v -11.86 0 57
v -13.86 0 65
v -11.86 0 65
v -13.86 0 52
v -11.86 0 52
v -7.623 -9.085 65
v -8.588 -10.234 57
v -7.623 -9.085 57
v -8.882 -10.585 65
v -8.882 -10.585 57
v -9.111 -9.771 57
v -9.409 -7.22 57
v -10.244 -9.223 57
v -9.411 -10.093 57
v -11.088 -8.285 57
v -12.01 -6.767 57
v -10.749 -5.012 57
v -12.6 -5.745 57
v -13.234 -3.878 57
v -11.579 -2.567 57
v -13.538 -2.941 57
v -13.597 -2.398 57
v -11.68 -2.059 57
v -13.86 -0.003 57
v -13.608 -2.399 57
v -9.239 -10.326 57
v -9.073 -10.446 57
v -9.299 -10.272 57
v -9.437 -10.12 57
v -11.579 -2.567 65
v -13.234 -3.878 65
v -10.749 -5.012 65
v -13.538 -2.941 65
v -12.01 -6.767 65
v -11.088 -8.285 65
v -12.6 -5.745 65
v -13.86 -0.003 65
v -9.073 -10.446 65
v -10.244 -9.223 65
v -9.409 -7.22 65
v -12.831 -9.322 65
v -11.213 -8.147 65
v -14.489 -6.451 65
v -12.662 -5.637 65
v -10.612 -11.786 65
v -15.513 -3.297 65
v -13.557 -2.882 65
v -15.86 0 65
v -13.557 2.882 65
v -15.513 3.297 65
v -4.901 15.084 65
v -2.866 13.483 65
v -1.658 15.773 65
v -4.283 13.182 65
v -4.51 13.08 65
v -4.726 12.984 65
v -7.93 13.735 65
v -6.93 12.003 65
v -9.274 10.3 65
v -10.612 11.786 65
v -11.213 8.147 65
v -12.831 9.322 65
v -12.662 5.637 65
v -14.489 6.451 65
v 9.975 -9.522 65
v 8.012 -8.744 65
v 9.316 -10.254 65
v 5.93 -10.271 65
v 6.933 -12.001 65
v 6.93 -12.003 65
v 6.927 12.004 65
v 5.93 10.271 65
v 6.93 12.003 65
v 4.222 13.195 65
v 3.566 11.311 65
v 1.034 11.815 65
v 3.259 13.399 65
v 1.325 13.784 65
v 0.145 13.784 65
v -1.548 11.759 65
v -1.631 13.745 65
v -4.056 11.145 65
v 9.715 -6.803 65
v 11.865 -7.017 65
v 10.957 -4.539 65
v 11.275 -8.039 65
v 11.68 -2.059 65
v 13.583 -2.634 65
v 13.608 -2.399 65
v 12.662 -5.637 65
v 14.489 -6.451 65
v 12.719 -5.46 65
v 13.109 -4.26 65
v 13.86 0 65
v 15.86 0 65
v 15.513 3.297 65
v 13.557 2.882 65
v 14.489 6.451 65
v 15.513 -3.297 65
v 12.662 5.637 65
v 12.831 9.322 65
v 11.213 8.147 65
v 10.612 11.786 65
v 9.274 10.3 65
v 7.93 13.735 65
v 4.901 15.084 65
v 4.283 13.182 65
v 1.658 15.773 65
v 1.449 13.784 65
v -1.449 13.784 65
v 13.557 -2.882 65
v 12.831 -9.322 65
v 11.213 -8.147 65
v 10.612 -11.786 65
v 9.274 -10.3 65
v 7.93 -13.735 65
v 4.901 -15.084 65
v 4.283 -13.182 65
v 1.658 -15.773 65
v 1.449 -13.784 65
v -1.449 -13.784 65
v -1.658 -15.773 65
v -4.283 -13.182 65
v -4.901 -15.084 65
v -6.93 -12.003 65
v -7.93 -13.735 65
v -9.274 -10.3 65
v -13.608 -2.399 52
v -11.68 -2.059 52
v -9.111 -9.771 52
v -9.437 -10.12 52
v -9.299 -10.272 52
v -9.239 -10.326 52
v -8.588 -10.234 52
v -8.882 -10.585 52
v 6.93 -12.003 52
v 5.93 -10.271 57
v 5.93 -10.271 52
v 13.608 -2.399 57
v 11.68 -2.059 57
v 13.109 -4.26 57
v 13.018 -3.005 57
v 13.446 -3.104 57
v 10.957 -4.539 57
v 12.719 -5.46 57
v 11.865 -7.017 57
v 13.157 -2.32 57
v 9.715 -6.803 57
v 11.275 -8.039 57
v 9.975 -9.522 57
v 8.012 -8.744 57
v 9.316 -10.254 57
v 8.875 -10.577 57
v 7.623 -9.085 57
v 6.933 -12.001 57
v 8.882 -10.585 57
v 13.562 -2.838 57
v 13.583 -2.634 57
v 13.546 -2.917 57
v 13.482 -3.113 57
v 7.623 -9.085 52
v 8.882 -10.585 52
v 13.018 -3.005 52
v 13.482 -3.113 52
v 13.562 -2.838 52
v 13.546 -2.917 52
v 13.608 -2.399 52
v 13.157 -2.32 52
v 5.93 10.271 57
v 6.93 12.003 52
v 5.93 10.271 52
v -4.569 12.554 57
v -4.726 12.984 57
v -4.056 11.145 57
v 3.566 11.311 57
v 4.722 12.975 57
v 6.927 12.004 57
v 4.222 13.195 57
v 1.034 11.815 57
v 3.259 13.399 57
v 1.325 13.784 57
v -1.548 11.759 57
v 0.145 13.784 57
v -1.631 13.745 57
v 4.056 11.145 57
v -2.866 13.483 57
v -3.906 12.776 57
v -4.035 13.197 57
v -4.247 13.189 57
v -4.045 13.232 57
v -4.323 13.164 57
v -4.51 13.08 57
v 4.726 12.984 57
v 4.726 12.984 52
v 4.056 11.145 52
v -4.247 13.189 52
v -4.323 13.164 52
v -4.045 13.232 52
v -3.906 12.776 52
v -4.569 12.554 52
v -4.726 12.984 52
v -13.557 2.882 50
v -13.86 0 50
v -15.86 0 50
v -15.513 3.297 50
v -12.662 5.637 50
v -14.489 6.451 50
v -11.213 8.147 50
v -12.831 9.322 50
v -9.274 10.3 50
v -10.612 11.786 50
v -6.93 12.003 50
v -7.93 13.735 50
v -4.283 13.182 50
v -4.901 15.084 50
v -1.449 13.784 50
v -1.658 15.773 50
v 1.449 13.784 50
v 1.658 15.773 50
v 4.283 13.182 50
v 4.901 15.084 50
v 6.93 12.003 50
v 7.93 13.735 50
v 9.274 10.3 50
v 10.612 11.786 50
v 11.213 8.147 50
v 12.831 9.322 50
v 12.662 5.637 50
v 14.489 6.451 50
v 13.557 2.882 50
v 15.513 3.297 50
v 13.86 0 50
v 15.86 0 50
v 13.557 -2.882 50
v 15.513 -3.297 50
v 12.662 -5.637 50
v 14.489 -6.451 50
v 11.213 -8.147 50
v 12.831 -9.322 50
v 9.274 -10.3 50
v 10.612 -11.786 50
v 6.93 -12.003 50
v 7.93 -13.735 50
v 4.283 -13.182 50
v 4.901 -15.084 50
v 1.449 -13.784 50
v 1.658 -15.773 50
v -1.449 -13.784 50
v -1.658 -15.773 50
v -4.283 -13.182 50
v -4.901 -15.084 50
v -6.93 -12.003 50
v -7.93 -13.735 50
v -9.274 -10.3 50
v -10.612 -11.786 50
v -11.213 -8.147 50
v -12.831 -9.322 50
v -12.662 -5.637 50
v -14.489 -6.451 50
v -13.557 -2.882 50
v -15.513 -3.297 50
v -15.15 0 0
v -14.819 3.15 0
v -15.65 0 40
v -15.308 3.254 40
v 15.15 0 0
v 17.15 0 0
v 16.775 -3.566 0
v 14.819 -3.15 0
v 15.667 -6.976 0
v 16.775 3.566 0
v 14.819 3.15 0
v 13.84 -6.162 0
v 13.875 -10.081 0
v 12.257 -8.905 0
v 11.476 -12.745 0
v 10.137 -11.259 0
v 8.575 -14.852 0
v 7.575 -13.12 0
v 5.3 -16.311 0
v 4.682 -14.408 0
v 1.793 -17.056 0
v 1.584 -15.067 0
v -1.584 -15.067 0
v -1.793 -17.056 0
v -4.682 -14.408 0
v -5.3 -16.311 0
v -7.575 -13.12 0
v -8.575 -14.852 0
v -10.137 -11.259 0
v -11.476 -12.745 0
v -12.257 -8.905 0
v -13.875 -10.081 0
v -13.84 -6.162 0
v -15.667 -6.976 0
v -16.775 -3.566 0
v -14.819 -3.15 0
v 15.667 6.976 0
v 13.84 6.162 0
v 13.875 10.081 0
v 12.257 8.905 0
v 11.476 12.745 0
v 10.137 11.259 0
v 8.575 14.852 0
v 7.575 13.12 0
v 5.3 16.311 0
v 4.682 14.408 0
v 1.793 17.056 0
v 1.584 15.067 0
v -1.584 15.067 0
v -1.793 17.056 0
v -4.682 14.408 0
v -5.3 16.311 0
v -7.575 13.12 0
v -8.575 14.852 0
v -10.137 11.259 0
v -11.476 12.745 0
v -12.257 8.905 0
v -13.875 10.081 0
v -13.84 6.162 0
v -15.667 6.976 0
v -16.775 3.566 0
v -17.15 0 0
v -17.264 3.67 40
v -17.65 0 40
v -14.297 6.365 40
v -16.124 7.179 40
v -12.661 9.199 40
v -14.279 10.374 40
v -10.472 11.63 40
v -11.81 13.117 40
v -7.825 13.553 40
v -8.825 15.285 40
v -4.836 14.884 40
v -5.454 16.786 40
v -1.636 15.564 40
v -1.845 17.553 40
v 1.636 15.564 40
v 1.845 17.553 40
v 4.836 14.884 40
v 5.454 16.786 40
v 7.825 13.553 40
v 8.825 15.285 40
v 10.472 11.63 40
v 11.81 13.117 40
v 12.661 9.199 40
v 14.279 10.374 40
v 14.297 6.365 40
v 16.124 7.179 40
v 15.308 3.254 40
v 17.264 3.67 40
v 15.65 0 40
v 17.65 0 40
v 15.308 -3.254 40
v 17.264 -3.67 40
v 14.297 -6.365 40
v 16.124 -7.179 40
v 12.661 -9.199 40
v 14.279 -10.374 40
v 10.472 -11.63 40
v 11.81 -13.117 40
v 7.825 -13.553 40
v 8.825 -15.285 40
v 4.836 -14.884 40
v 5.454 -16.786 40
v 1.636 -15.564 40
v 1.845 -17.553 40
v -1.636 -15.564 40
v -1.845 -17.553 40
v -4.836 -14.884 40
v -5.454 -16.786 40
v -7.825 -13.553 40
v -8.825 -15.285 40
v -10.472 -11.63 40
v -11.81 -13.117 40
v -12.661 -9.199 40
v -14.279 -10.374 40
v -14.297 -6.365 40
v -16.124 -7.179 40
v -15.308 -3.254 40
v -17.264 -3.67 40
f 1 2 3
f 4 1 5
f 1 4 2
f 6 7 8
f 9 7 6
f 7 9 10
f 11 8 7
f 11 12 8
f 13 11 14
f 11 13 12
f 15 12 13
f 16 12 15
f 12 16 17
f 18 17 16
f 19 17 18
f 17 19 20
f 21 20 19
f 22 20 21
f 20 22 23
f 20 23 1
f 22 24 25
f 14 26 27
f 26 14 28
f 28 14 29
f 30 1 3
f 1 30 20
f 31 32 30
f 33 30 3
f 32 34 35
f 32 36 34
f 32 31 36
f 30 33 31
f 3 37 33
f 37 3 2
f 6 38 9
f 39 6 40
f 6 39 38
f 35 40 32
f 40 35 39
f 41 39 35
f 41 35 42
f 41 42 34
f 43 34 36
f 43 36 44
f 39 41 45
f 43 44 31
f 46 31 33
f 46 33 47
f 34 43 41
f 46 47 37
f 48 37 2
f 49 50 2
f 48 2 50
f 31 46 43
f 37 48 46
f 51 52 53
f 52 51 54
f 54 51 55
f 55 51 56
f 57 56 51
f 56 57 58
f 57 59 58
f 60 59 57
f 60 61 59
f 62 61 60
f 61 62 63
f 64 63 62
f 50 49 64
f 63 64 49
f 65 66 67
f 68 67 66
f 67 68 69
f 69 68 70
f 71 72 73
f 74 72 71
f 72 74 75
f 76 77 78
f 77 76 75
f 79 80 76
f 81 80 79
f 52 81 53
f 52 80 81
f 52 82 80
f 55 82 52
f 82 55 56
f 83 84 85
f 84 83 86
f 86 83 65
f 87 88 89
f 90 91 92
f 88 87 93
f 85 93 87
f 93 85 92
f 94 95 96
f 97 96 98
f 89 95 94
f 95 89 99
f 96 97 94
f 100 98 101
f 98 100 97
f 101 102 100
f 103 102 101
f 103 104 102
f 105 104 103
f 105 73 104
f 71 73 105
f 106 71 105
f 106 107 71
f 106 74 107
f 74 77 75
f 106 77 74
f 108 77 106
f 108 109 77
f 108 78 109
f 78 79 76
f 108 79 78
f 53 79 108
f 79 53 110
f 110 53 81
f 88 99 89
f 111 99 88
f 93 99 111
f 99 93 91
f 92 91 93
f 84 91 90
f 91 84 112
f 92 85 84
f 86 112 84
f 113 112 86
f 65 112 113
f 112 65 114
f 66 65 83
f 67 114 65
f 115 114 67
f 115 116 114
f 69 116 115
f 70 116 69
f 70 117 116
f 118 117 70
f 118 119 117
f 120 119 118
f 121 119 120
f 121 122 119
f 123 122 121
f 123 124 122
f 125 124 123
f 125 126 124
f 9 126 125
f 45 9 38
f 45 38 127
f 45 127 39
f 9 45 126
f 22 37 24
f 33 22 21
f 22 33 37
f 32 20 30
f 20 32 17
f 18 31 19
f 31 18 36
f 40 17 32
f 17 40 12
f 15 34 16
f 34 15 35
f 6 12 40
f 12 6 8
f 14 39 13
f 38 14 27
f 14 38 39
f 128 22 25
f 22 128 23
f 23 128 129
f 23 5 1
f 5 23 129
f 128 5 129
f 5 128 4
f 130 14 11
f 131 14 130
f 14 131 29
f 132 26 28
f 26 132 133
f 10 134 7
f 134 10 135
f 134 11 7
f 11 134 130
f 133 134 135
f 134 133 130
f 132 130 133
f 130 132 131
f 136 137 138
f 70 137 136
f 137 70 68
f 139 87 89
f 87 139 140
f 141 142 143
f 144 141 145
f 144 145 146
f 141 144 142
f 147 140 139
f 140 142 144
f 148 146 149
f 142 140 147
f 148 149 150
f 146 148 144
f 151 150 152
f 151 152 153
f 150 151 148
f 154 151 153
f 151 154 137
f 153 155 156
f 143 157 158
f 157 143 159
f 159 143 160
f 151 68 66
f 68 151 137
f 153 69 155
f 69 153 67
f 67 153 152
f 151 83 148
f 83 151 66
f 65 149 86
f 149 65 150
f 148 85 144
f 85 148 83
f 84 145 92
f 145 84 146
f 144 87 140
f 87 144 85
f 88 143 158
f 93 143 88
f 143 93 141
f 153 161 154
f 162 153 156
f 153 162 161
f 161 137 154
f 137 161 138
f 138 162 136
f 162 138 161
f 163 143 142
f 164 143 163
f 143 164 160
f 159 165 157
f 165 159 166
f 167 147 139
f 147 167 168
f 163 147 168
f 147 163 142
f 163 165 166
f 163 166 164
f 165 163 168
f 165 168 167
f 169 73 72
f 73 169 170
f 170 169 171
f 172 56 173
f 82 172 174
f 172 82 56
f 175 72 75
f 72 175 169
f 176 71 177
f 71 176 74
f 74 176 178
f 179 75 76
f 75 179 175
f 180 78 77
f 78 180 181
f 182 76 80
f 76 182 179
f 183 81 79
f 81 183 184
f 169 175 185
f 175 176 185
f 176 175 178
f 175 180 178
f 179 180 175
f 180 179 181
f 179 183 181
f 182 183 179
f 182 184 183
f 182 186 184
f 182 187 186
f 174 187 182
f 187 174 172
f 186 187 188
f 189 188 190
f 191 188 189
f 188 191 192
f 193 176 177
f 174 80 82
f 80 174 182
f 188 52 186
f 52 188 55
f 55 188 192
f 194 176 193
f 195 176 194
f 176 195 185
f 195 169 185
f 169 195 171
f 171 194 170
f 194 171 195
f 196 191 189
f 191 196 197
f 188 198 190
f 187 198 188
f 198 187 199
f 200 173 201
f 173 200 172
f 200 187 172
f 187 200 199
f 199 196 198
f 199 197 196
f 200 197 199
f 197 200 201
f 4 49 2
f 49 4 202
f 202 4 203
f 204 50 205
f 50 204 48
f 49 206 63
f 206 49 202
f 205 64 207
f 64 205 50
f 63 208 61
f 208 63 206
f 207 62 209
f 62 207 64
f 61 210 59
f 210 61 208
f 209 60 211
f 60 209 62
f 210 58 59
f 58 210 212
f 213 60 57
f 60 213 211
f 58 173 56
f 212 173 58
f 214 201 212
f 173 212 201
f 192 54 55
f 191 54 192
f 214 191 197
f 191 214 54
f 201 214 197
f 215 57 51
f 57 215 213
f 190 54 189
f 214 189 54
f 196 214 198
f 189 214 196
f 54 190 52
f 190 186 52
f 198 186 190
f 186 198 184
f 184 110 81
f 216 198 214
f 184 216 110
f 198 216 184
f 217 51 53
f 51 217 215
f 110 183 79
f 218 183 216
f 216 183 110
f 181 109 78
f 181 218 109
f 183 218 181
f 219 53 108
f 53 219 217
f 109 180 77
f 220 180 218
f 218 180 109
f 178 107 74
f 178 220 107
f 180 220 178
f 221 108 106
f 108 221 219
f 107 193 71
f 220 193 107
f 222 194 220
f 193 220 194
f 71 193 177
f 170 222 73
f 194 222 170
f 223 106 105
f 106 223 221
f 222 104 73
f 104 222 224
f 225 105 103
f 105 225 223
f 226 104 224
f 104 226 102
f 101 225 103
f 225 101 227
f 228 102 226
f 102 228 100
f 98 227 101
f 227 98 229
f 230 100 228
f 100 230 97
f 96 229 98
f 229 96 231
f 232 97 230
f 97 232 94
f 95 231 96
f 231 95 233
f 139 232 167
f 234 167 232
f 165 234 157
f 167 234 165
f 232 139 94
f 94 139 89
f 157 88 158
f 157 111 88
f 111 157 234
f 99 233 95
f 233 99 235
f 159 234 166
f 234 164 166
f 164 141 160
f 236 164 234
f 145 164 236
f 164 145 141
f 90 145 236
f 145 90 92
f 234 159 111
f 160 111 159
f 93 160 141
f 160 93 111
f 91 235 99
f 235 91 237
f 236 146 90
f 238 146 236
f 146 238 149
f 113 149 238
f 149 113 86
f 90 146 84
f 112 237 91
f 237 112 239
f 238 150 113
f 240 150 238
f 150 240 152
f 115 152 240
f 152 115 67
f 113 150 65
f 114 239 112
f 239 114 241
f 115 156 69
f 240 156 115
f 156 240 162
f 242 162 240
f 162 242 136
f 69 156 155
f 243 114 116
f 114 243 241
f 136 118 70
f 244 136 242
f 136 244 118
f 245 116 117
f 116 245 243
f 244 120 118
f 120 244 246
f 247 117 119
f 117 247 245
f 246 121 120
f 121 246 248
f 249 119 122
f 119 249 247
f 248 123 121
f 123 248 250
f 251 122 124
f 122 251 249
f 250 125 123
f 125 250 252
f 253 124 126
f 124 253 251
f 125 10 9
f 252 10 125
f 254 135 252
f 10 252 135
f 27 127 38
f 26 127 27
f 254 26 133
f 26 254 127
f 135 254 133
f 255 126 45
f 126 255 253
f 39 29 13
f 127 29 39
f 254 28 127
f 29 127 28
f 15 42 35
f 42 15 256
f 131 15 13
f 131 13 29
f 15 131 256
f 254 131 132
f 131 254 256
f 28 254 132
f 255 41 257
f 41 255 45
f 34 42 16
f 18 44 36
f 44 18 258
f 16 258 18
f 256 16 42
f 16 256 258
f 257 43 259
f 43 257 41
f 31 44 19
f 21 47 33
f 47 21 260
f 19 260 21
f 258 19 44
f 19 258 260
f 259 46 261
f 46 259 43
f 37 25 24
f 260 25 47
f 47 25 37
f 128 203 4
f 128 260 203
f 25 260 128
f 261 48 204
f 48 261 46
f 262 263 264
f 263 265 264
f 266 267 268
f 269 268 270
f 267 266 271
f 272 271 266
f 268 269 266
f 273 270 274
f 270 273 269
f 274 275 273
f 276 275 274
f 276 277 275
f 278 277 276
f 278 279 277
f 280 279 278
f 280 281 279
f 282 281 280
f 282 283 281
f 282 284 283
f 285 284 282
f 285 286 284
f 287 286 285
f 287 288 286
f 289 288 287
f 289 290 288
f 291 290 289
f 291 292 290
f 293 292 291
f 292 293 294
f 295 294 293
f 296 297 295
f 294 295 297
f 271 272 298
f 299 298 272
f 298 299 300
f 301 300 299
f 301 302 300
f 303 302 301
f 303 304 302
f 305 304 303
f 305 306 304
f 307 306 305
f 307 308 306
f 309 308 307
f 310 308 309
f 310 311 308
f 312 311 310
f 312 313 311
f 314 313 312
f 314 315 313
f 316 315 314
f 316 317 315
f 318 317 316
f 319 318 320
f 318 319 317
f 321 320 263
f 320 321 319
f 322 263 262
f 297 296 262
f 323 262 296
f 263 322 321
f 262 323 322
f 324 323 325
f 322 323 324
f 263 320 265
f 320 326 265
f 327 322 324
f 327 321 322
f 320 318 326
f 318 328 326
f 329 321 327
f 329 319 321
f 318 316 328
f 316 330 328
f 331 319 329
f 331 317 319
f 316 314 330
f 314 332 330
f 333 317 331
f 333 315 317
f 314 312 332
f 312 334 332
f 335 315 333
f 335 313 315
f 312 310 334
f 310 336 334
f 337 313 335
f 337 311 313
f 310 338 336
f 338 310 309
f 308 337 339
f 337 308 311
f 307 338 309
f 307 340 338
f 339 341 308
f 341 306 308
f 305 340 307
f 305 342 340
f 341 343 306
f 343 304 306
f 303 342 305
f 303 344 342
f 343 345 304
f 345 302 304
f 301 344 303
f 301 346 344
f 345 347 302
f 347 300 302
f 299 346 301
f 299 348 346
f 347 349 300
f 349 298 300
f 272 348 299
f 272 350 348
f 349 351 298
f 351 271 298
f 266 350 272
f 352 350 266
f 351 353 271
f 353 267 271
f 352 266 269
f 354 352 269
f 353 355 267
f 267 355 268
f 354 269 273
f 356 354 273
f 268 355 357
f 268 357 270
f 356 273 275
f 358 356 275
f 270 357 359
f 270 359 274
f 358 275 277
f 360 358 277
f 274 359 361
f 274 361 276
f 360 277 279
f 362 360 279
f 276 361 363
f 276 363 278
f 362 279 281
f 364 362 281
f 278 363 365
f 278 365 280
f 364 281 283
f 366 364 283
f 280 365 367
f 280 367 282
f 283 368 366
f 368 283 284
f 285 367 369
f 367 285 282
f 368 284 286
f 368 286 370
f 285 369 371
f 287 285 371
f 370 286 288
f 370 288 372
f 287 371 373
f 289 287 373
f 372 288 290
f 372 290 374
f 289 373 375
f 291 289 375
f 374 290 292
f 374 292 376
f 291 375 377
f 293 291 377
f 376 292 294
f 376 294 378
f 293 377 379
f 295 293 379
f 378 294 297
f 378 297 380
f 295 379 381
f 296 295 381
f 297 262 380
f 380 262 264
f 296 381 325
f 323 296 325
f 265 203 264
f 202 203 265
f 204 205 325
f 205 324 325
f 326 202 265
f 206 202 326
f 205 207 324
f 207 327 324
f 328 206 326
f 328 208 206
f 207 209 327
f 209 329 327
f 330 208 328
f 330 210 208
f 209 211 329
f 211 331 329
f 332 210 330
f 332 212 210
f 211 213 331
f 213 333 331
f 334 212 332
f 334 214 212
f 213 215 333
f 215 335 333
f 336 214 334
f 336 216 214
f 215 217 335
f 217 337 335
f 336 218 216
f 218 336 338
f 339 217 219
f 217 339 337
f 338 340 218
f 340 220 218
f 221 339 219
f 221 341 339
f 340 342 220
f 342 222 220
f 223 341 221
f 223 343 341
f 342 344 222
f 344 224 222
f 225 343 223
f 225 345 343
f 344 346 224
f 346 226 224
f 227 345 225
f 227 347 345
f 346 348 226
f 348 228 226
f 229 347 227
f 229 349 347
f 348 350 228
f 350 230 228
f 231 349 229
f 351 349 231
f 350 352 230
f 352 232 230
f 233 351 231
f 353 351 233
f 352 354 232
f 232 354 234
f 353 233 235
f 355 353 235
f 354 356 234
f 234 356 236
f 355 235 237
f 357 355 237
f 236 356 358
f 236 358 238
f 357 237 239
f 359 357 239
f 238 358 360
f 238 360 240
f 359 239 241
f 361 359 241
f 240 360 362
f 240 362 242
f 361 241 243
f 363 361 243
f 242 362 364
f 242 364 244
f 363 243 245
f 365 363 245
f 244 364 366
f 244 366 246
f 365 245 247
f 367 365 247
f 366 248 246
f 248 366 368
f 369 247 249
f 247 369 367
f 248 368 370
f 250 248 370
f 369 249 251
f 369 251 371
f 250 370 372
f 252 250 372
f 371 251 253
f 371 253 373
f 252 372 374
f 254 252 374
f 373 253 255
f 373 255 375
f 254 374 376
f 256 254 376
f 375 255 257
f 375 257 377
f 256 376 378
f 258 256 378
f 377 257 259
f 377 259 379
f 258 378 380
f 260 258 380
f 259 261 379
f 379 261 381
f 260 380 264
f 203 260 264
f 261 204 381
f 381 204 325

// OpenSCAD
/* [Global] */
wallThickness = 2;

/* [Hose] */
// What is the minimal inside diameter of a external hose you would like to connect?
yourHoseMinInsideDia = 34.3;
// What is the maximal inside diameter of a external hose you would like to connect?
yourHoseMaxInsideDia = 35.3;
// How high should the hose adapter end be? Keep in mind that the steeper the angle the more will your hose fall out. It seems reasonable to give at least 10mm for each 1mm of taper.
hoseAdapterHeight = 40;
/* [Internal] */
// Height of the middle part between hose taper and Festool locking mechanism. Unless you have wastly different port and hose diameters, you can probably keep it fairly small (10mm).
taperBetweenPartsHeight = 10; 
/* [Festool] */
// I've successfully tested 25mm with the Cleantec port on Festool Domino DF500, which is branded as DF27.
festoolPortOutsideDia = 27.72;
// TODO 25mm was too small !!! test sample 1 against the domino

module hoseAdapter(taperHeight, outsideDiaBot, outsideDiaTop) {
    insideDiaBot = outsideDiaBot - 2*wallThickness;
    insideDiaTop = outsideDiaTop - 2*wallThickness;

    rotate_extrude(angle = 360)
    polygon([
        [insideDiaBot/2, 0],
        [outsideDiaBot/2, 0],
        [outsideDiaTop/2, taperHeight],
        [insideDiaTop/2, taperHeight],
    ]);
}

module festoolCleantecPort(insideDia) {
    festoolHeight = 15;

    // festool part
    rotate_extrude(angle = 360)
    polygon([
        [insideDia/2, 0],
        [insideDia/2+2, 0],
        [insideDia/2+2, festoolHeight],
        [insideDia/2, festoolHeight],
    ]);

    // festool lock
    lockHeight = 8;
    lockWallHeight = 5;
    lockAngleFill = 360/6 - 10;
    lockAngleSpace = (360 - 3*lockAngleFill)/3;
    lockinWallAngle = 3;

    for(angleOffset=[0:lockAngleFill+lockAngleSpace:360])
        group() {
            // depth stop / yank barrier
            rotate(angleOffset)
            translate([0, 0, festoolHeight-lockHeight])
            rotate_extrude(angle = lockAngleFill)
            translate([-insideDia/2, 0, 0])
            square(size=[2,lockHeight]);

            // over-rotation stop
            rotate(angleOffset)
            translate([0, 0, festoolHeight-lockHeight-lockWallHeight])
            rotate_extrude(angle = 10)
            translate([-insideDia/2, 0, 0])
            square(size=[2,lockWallHeight]);

            // rotation lockin minor wall
            rotate(angleOffset-lockinWallAngle+lockAngleFill)
            translate([0, 0, festoolHeight-lockHeight-lockWallHeight])
            rotate_extrude(angle = lockinWallAngle)
            translate([-insideDia/2, 0, 0])
            square(size=[0.5,lockWallHeight]);
        }
}

hoseAdapter(taperHeight = hoseAdapterHeight, outsideDiaBot = yourHoseMinInsideDia, outsideDiaTop = yourHoseMaxInsideDia);
translate([0, 0, hoseAdapterHeight])
    hoseAdapter(taperHeight = taperBetweenPartsHeight, outsideDiaBot = yourHoseMaxInsideDia, outsideDiaTop = festoolPortOutsideDia + 2*wallThickness);
translate([0, 0, hoseAdapterHeight + taperBetweenPartsHeight])
    festoolCleantecPort(insideDia = festoolPortOutsideDia);
